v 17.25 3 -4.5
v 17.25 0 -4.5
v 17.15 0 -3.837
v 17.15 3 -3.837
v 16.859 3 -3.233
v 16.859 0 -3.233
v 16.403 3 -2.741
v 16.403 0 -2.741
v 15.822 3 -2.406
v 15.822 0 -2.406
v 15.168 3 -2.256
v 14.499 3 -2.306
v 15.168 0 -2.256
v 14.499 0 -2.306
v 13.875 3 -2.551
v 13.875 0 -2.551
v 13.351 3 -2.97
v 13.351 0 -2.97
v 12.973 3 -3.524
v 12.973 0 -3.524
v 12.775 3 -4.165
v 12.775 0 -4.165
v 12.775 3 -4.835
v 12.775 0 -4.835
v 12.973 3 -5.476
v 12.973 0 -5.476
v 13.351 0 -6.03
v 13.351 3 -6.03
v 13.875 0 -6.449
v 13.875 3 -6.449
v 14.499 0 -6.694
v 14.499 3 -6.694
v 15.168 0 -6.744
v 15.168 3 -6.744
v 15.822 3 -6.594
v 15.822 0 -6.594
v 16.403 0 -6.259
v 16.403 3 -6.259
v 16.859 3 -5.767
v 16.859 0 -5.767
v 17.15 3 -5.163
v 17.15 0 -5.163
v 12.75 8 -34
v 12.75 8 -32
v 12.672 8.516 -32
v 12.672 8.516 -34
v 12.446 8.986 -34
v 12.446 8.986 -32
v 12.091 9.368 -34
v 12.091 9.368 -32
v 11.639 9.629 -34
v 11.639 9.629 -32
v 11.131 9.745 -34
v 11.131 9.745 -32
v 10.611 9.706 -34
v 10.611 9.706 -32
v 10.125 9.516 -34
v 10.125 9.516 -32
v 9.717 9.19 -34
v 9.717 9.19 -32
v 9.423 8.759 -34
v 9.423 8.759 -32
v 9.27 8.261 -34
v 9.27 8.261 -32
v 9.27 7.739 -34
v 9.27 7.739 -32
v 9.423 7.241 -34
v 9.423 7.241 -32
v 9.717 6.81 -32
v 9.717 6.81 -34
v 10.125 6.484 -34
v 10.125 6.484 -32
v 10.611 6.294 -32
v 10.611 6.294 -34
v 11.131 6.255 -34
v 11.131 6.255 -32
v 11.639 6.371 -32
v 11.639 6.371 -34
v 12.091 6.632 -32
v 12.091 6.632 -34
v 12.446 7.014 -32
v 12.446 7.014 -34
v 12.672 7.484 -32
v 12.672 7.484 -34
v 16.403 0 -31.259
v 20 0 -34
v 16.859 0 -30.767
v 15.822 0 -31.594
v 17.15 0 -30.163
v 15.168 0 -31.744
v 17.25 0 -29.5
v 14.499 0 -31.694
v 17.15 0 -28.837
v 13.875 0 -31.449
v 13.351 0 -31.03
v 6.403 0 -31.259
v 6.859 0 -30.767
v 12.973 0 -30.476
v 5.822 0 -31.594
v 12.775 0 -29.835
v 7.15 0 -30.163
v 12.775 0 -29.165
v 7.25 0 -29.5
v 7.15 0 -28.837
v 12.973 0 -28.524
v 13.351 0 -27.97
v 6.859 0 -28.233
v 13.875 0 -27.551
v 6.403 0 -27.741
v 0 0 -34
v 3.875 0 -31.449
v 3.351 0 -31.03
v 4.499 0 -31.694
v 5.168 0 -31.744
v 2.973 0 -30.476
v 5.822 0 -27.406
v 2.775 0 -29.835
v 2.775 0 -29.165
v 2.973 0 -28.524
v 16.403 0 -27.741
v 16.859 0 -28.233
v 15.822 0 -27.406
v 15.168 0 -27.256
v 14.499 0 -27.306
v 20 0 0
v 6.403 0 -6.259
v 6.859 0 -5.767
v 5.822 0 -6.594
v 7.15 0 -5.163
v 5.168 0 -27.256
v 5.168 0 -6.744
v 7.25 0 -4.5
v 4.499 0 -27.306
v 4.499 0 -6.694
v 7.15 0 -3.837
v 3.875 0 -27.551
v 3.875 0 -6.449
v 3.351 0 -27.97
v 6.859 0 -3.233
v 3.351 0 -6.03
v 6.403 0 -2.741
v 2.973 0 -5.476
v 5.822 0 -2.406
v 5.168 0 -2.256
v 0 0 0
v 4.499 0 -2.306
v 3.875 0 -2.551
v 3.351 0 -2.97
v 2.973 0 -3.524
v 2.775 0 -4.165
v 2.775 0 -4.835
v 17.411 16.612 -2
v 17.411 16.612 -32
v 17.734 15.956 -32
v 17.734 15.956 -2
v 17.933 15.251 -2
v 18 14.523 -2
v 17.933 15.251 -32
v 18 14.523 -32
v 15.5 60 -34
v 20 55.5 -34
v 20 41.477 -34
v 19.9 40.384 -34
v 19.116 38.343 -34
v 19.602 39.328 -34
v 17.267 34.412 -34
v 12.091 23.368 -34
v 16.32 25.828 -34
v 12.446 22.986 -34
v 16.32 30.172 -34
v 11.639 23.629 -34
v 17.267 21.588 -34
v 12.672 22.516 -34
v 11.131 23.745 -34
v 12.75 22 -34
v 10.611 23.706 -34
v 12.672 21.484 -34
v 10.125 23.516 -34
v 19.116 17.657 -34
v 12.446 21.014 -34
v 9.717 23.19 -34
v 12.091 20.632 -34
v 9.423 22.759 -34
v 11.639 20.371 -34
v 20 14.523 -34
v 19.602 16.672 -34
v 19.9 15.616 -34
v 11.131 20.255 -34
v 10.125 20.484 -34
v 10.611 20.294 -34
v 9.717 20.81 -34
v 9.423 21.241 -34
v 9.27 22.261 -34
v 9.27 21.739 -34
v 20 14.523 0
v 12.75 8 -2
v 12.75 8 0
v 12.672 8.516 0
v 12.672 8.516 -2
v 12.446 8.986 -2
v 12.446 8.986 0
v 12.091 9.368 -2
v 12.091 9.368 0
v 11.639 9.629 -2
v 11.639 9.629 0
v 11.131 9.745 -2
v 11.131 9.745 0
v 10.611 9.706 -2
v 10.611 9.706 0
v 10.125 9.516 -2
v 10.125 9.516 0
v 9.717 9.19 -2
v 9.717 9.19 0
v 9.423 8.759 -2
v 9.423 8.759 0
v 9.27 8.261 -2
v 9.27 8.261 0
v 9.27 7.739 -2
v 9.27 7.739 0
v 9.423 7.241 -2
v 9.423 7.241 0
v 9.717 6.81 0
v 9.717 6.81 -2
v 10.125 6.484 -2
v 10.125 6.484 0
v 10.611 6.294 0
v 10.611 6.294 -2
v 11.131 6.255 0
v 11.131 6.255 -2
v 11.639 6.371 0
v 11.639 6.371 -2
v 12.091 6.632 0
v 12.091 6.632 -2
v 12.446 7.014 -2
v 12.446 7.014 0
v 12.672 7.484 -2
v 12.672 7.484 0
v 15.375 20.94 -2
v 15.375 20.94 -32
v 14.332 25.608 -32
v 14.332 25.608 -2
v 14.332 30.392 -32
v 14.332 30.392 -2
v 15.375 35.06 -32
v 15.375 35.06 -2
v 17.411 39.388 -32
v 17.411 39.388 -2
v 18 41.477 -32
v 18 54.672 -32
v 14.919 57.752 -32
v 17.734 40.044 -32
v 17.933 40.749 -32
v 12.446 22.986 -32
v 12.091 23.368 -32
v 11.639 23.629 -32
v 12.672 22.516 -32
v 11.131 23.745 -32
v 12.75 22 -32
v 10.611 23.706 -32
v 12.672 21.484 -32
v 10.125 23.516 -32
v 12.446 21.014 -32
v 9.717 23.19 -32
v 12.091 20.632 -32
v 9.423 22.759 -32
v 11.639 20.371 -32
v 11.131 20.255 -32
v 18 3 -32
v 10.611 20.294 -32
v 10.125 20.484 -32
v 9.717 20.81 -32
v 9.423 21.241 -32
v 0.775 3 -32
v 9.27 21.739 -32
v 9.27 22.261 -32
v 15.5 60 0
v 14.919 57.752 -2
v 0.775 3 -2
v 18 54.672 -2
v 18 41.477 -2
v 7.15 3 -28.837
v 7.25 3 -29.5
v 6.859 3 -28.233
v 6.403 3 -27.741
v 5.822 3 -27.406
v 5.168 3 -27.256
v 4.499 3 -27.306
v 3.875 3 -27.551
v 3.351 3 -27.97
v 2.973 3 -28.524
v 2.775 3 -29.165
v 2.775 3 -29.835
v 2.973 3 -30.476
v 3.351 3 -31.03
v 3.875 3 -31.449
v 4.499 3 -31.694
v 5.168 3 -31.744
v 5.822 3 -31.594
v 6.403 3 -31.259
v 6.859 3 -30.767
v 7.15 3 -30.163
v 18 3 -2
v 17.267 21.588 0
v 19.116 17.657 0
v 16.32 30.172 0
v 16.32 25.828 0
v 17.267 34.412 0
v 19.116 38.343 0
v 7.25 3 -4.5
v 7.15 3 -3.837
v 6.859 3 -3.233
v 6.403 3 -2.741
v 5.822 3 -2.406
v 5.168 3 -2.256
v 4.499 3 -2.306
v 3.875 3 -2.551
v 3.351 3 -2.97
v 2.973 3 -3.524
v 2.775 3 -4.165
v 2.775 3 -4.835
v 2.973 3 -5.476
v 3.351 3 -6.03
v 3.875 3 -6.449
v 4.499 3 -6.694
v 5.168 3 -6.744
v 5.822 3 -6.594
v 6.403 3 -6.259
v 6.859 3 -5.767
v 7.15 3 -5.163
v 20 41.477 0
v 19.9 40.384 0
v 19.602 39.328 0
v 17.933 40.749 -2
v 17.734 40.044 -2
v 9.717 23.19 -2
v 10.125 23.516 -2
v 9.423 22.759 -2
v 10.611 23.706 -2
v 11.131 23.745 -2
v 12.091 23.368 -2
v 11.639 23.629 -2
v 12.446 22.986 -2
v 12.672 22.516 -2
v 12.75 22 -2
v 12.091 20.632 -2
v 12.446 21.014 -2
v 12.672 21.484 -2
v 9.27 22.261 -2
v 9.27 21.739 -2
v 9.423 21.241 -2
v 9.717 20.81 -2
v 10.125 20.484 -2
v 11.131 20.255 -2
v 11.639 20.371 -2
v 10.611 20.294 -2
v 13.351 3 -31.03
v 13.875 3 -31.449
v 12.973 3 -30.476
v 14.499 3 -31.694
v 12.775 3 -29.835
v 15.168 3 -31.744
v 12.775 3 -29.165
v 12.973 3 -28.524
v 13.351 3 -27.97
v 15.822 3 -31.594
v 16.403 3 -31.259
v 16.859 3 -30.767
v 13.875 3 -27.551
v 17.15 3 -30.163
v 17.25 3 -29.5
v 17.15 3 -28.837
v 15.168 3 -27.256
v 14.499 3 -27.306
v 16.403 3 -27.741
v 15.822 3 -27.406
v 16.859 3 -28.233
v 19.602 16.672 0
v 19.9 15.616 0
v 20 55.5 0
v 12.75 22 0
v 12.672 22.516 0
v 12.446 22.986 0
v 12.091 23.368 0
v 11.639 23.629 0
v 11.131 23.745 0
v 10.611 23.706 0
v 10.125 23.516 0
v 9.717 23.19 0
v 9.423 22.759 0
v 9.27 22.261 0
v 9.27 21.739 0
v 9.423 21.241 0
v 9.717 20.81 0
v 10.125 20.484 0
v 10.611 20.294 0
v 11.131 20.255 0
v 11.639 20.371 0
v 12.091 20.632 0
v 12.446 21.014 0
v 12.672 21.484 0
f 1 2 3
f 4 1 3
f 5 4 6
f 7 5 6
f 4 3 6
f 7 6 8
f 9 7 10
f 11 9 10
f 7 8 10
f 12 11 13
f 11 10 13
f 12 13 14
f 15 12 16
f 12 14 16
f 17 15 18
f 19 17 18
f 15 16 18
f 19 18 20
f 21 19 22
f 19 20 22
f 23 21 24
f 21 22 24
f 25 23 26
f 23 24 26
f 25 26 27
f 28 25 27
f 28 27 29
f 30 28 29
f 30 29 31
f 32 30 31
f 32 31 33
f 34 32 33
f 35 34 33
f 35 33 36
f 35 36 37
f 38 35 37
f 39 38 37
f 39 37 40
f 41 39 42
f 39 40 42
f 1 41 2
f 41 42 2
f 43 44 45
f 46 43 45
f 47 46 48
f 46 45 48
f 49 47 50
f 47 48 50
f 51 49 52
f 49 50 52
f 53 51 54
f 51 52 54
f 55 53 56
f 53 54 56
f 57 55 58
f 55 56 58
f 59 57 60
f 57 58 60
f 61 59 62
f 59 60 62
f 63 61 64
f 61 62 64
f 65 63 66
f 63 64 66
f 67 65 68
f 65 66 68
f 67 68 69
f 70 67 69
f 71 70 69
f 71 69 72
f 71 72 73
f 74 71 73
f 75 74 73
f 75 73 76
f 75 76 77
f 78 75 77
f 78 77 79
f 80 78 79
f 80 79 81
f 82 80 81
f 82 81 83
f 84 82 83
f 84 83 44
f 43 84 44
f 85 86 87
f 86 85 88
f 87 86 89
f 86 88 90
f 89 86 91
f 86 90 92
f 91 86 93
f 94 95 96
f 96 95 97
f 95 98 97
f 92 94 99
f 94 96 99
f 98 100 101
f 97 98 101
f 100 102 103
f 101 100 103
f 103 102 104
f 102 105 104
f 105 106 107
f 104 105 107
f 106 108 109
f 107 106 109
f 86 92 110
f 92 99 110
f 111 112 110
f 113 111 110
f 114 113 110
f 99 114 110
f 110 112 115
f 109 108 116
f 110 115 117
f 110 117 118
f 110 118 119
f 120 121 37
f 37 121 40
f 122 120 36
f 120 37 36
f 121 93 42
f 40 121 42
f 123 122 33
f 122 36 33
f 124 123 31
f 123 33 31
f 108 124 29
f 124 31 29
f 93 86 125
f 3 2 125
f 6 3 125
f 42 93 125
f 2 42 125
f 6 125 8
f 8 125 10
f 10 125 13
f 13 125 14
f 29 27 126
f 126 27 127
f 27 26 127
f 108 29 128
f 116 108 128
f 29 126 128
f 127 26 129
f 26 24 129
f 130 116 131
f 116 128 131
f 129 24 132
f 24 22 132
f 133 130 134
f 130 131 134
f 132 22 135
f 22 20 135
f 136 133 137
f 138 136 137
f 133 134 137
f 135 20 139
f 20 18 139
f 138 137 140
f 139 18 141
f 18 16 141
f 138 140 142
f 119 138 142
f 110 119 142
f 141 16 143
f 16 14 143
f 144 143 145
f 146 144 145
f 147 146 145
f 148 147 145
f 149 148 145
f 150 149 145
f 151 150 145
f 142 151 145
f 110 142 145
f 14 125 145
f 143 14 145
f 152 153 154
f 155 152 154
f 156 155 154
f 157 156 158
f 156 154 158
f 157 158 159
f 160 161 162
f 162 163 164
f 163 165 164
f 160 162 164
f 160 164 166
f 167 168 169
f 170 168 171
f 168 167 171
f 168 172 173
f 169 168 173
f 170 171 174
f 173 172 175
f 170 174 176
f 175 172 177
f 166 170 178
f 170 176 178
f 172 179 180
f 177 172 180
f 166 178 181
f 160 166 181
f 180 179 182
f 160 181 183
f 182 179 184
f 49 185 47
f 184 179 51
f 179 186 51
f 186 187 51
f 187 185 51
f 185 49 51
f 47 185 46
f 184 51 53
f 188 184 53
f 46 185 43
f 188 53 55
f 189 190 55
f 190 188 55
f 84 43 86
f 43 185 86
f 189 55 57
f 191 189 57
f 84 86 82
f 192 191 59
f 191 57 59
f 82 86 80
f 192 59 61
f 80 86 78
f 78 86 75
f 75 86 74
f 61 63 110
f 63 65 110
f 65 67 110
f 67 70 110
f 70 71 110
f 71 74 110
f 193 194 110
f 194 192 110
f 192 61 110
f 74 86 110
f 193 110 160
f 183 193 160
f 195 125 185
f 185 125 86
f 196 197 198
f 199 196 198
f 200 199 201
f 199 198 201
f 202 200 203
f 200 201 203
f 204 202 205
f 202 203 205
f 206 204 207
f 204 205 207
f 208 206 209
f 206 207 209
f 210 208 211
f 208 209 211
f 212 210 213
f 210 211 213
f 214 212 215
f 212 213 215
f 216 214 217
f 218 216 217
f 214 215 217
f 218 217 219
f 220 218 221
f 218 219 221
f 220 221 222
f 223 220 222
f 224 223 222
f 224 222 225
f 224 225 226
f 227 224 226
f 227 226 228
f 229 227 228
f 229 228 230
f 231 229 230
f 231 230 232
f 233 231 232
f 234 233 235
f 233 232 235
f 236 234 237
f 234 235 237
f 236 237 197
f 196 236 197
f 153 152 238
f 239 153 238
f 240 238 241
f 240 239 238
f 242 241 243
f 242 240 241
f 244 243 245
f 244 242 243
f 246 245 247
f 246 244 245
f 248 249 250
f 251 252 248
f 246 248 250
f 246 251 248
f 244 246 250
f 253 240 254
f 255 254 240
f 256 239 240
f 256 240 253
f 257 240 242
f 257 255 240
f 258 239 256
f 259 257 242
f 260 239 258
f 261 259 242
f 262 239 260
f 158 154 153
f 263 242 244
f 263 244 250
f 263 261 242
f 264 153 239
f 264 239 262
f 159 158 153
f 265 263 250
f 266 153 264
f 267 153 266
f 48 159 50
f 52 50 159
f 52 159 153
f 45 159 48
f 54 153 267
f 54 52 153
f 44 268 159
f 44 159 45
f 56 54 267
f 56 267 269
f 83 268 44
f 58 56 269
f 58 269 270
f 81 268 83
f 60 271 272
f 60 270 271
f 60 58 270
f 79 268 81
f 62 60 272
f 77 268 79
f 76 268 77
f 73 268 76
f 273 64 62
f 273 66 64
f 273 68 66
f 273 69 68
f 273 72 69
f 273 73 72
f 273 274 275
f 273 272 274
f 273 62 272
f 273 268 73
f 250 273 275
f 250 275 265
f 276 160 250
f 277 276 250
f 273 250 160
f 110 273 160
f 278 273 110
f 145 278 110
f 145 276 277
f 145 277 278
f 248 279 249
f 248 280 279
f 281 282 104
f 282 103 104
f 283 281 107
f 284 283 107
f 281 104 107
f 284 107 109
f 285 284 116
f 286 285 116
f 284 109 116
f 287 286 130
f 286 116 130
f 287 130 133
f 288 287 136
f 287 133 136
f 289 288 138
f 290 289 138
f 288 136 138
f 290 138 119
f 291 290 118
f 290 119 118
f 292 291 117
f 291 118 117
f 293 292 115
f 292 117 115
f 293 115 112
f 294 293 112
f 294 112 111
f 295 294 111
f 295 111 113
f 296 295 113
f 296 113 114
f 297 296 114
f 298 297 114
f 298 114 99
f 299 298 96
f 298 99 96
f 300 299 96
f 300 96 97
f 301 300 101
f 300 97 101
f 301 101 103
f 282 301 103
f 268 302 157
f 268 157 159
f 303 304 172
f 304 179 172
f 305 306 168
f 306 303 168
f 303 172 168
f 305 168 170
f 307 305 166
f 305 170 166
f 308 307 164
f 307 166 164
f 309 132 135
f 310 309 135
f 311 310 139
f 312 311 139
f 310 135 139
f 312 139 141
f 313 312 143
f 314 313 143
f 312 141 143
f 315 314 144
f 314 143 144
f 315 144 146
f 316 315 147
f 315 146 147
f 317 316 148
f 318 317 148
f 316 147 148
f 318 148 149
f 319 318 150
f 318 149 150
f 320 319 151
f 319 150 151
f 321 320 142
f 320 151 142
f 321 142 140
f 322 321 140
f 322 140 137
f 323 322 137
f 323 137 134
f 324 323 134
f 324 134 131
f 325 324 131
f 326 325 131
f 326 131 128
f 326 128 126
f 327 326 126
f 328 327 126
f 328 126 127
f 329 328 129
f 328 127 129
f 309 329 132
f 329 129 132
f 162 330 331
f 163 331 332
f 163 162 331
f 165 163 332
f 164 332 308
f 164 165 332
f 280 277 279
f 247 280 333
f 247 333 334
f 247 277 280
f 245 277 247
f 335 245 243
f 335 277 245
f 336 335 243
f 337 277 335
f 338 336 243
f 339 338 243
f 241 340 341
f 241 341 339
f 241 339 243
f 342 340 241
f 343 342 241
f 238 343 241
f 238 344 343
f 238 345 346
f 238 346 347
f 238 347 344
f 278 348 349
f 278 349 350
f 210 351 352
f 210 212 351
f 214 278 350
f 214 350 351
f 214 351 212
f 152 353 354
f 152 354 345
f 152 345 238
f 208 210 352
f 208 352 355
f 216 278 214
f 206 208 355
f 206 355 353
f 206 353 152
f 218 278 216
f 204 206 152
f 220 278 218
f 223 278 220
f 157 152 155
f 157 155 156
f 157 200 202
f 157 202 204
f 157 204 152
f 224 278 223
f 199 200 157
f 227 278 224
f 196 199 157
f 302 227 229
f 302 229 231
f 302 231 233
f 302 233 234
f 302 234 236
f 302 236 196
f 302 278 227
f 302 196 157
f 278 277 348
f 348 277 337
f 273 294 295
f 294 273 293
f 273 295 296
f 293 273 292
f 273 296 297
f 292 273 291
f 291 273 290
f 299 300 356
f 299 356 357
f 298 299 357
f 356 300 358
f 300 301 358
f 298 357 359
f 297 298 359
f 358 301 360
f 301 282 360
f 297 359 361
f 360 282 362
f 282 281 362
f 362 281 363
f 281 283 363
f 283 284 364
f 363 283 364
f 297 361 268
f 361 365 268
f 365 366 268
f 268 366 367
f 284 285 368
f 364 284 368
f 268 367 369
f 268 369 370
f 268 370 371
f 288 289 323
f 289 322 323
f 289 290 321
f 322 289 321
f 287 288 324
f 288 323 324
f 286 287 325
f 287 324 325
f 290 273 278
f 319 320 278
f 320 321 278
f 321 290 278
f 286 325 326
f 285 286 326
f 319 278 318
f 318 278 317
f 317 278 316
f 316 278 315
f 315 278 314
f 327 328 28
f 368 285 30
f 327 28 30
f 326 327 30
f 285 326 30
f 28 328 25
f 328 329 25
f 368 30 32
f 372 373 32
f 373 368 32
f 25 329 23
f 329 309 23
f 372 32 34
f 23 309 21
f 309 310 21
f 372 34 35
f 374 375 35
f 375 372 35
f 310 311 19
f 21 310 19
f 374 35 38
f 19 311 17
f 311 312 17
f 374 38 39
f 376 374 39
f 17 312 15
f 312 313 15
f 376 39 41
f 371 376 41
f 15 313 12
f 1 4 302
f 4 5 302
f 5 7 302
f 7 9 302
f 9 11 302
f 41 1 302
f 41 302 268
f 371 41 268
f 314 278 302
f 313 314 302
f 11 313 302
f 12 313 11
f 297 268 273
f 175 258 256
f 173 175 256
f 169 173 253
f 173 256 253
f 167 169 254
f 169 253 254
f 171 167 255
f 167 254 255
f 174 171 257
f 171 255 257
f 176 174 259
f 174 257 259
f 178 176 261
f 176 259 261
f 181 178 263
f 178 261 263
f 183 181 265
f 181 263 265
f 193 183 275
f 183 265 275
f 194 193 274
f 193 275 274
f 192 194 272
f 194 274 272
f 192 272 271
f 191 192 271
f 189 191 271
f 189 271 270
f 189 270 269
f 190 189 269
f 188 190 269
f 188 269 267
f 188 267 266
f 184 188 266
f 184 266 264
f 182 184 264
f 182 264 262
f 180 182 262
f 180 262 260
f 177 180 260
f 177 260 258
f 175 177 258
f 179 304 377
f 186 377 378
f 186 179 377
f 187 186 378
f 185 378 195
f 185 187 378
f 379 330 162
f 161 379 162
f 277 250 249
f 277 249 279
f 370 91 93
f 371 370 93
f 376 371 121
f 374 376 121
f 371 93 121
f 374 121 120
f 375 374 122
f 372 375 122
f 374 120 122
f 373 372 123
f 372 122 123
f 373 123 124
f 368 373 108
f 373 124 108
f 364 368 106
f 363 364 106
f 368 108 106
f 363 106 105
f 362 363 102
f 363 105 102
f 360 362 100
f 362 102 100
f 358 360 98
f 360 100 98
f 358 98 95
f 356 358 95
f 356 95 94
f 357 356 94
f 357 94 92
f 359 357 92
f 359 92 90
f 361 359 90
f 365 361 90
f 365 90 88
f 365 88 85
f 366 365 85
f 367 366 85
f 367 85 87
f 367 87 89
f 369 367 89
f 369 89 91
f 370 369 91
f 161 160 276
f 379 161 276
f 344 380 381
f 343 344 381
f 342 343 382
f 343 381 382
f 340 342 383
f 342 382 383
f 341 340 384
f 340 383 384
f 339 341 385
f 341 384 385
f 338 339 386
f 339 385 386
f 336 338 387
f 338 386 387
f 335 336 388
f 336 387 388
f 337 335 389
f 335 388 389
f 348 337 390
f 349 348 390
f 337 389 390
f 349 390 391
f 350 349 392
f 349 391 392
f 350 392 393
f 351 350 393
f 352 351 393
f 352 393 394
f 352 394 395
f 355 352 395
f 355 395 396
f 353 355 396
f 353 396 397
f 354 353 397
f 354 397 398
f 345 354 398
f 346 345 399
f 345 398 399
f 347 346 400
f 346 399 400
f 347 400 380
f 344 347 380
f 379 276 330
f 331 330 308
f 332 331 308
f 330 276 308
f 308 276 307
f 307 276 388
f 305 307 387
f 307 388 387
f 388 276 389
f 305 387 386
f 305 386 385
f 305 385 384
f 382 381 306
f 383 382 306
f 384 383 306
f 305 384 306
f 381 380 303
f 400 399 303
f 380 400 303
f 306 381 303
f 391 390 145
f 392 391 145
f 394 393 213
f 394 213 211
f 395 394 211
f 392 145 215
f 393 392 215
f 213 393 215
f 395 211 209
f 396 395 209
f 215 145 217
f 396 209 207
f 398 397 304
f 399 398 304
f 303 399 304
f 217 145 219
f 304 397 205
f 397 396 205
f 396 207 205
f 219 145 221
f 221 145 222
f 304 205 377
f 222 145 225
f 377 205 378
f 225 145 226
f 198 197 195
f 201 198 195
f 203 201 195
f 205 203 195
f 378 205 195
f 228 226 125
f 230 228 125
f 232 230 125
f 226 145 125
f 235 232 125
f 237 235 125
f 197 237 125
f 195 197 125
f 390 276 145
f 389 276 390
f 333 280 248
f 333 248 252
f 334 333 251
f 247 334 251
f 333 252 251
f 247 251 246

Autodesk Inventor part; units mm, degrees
ref_plane "YZ Plane" through (0, 0, 0) normal (1, 0, 0) x (0, 1, 0)
ref_plane "XZ Plane" through (0, 0, 0) normal (0, 1, 0) x (-1, 0, 0)
ref_plane "XY Plane" through (0, 0, 0) normal (0, 0, 1) x (1, 0, 0)
sketch "Sketch1" plane through (0, 0, 0) normal (0, 1, 0) x (-1, 0, 0)
  line L0 (0, 0) -> (-20, 0)
  line L1 (-20, 0) -> (-20, -34)
  line L2 (-20, -34) -> (0, -34)
  line L3 (0, -34) -> (0, 0)
  dimension "d0" = 34
  dimension "d1" = 20
extrude "Extrusion1" add sketch "Sketch1" along normal blind 60
chamfer "Chamfer1" distance 4.5 angle 45 1 edges at (20, 60, -17)
sketch "Sketch3" plane through (0, 0, 0) normal (0, 0, 1) x (1, 0, 0)
  line L0 (0, 60) -> (15.5, 60) projected
  line L1 (15.5, 60) -> (0, 0)
  line L2 (0, 0) -> (20, 0) projected
  line L3 (20, 0) -> (0, 0)
  line L4 (0, 0) -> (0, 60)
  line L5 (0, 60) -> (20, 60)
  line L6 (20, 60) -> (20, 0)
extrude "Extrusion2" cut sketch "Sketch3" against normal blind 60 contours L0 L1 L4
sketch "Sketch4" plane through (20, 0, -34) normal (0, 0, -1) x (-1, 0, 0)
  circle A0 centre (-16, 28) radius 19.8
  line L0 (0, 0) -> (0, 55.5) projected
  line L1 (20, 0) -> (0, 0) projected
  dimension "d9" = 39.6
  dimension "d14" = 16
  dimension "d15" = 28
extrude "Extrusion3" cut sketch "Sketch4" against normal blind 60
fillet "Fillet1" radius 6 2 edges at (20, 16.3364, -17) (20, 39.6636, -17)
shell "Shell1" thickness 2 removed faces 1 at (10.3333, 40, -22.6667)
sketch "Sketch5" plane through (0, 0, 0) normal (0, 0, 1) x (1, 0, 0)
  line L0 (0, 0) -> (20, 0) projected
  line L1 (20, 0) -> (-6.4586, 0)
  line L2 (-6.4586, 0) -> (-6.4586, 3)
  line L3 (-6.4586, 3) -> (20, 3)
  line L4 (20, 3) -> (20, 0)
  line L5 (0, 0) -> (0.775, 3)
  line L6 (15.5, 60) -> (0, 0) projected
  dimension "d16" = 3
extrude "Extrusion4" add sketch "Sketch5" against normal blind 34 contours L5 L3 L4 L0
sketch "Sketch6" plane through (0, 0, 0) normal (0, -1, 0) x (1, 0, 0)
  circle A0 centre (5, -4.5) radius 2.25
  line L0 (0, 0) -> (20, 0) projected
  line L1 (0, -34) -> (0, 0) projected
  circle A1 centre (15, -4.5) radius 2.25
  circle A2 centre (5, -29.5) radius 2.25
  circle A3 centre (15, -29.5) radius 2.25
  dimension "d19" = 4.5
  dimension "d20" = 4.5
  dimension "d21" = 5
  dimension "d24" = 10
  dimension "d27" = 25
extrude "Extrusion5" cut sketch "Sketch6" against normal blind 3
sketch "Sketch7" plane through (0, 0, 0) normal (0, 0, 1) x (1, 0, 0)
  circle A0 centre (11, 8) radius 1.75
  line L0 (0, 0) -> (20, 0) projected
  line L1 (20, 0) -> (20, 14.5226) projected
  line L2 (20, 0) -> (20, 15.3258)
  circle A1 centre (11, 22) radius 1.75
  dimension "d32" = 3.5
  dimension "d33" = 8
  dimension "d34" = 11
  dimension "d37" = 14
extrude "Extrusion6" cut sketch "Sketch7" against normal through all
properties part number "Gripper"
